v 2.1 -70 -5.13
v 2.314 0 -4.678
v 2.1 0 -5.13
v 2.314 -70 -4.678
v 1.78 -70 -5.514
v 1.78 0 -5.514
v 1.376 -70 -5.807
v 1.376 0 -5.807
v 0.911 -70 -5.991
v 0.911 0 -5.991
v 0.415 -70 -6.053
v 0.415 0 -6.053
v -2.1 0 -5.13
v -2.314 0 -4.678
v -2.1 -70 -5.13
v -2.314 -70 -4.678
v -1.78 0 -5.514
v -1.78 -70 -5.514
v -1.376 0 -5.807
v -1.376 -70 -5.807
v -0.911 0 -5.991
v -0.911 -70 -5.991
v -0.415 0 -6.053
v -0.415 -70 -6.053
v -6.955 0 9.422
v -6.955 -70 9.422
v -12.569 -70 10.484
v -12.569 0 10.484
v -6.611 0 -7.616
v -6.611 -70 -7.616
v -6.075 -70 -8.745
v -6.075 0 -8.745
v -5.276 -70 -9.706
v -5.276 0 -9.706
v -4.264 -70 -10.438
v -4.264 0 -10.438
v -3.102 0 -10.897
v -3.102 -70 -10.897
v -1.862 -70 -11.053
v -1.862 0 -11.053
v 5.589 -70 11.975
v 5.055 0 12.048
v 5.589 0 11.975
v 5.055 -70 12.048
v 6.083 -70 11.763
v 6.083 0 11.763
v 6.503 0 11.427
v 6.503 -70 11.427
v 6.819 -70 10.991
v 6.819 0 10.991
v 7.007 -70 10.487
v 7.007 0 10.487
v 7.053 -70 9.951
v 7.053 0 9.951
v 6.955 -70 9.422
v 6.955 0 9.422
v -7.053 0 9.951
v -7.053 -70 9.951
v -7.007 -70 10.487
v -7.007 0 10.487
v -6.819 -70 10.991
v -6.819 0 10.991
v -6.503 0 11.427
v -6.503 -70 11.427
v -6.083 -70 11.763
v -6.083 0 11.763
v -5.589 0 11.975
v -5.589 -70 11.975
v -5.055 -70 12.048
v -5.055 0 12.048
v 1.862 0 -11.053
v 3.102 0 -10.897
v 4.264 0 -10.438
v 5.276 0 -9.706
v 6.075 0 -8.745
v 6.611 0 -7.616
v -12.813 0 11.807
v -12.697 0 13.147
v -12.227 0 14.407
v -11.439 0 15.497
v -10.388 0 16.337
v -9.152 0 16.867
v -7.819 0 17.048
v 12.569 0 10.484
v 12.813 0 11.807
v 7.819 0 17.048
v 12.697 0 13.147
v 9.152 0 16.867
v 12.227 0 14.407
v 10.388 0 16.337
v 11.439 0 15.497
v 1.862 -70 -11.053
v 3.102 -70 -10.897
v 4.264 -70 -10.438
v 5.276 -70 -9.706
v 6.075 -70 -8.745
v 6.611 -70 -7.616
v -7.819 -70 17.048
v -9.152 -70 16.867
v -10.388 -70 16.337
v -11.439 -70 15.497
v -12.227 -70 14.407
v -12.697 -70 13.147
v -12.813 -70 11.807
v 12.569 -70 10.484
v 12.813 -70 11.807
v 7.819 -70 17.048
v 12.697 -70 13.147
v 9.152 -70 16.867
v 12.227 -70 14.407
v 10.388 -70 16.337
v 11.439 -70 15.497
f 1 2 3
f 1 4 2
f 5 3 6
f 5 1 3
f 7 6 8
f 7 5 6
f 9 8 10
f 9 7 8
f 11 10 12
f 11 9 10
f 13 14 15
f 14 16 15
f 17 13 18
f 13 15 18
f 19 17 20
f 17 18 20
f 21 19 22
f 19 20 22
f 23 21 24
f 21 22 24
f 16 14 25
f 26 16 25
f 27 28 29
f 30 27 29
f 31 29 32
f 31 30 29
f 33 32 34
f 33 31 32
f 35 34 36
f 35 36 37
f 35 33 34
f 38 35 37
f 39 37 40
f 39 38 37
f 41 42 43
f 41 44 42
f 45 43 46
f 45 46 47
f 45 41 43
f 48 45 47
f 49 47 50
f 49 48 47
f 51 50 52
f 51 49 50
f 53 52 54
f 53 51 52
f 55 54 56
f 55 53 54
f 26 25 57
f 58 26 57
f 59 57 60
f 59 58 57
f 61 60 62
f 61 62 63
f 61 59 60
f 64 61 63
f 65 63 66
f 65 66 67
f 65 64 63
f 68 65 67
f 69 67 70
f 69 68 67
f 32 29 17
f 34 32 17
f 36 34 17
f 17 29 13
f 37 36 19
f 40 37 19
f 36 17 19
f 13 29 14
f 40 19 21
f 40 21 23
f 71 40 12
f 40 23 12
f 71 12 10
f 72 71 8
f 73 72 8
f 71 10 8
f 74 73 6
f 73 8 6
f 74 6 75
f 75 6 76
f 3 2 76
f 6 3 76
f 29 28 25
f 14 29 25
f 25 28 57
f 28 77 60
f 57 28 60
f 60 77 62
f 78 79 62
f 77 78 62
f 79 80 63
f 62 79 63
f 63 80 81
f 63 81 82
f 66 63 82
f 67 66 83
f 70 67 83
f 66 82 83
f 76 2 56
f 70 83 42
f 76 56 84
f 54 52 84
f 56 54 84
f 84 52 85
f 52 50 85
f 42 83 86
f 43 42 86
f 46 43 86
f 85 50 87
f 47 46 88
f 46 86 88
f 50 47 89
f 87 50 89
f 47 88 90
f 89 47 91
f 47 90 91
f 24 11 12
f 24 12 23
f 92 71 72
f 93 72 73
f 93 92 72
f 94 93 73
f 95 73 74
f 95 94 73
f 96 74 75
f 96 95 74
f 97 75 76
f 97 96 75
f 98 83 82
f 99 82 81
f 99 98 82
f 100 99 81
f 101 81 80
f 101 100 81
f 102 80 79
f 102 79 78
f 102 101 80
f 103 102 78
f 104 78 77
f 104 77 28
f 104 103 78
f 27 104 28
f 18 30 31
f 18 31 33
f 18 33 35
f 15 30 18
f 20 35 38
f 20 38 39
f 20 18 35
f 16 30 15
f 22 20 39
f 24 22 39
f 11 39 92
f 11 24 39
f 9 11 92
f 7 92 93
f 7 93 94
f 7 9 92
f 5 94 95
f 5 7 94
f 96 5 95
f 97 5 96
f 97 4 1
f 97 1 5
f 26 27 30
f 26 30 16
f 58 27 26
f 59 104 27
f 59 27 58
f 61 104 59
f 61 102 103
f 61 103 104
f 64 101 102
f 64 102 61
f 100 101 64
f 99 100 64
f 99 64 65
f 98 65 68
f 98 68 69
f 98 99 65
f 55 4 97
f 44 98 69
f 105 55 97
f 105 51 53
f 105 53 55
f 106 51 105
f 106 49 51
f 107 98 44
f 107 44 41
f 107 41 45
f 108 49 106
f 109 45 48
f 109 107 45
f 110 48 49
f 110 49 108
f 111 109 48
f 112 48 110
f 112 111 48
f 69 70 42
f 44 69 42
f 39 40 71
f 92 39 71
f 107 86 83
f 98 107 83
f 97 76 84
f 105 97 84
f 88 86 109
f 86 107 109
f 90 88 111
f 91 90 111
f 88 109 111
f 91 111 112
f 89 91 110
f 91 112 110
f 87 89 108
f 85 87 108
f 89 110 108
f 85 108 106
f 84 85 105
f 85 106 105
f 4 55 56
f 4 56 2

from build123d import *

# Parameters (mm, degrees)
F1_DEPTH = 70
F2_R     = 5
F3_R     = 2


with BuildPart() as f1:
    # F0 (on Front) → F1 (new body)
    with BuildSketch(Plane.XZ):
        Polygon((14.728606, 17.047576), (0, 17.047576), (-14.728606, 17.047576), (-5.480258, -11.053172), (0, -11.053172), (5.480258, -11.053172), align=None)
        Polygon((-7.819207, 12.047576), (0, 12.047576), (7.819207, 12.047576), (1.861998, -6.053172), (0, -6.053172), (-1.861998, -6.053172), align=None, mode=Mode.SUBTRACT)
    extrude(amount=F1_DEPTH)

    # F2
    f2_edges = [f1.edges().sort_by_distance(p)[0] for p in [
        (14.728606, -35, 17.047576),
        (5.480258, -35, -11.053172),
        (-5.480258, -35, -11.053172),
        (-14.728606, -35, 17.047576),
    ]]
    fillet(f2_edges, radius=F2_R)

    # F3
    f3_edges = [f1.edges().sort_by_distance(p)[0] for p in [
        (-1.861998, -35, -6.053172),
        (1.861998, -35, -6.053172),
        (7.819207, -35, 12.047576),
        (-7.819207, -35, 12.047576),
    ]]
    fillet(f3_edges, radius=F3_R)


solid = f1.part
